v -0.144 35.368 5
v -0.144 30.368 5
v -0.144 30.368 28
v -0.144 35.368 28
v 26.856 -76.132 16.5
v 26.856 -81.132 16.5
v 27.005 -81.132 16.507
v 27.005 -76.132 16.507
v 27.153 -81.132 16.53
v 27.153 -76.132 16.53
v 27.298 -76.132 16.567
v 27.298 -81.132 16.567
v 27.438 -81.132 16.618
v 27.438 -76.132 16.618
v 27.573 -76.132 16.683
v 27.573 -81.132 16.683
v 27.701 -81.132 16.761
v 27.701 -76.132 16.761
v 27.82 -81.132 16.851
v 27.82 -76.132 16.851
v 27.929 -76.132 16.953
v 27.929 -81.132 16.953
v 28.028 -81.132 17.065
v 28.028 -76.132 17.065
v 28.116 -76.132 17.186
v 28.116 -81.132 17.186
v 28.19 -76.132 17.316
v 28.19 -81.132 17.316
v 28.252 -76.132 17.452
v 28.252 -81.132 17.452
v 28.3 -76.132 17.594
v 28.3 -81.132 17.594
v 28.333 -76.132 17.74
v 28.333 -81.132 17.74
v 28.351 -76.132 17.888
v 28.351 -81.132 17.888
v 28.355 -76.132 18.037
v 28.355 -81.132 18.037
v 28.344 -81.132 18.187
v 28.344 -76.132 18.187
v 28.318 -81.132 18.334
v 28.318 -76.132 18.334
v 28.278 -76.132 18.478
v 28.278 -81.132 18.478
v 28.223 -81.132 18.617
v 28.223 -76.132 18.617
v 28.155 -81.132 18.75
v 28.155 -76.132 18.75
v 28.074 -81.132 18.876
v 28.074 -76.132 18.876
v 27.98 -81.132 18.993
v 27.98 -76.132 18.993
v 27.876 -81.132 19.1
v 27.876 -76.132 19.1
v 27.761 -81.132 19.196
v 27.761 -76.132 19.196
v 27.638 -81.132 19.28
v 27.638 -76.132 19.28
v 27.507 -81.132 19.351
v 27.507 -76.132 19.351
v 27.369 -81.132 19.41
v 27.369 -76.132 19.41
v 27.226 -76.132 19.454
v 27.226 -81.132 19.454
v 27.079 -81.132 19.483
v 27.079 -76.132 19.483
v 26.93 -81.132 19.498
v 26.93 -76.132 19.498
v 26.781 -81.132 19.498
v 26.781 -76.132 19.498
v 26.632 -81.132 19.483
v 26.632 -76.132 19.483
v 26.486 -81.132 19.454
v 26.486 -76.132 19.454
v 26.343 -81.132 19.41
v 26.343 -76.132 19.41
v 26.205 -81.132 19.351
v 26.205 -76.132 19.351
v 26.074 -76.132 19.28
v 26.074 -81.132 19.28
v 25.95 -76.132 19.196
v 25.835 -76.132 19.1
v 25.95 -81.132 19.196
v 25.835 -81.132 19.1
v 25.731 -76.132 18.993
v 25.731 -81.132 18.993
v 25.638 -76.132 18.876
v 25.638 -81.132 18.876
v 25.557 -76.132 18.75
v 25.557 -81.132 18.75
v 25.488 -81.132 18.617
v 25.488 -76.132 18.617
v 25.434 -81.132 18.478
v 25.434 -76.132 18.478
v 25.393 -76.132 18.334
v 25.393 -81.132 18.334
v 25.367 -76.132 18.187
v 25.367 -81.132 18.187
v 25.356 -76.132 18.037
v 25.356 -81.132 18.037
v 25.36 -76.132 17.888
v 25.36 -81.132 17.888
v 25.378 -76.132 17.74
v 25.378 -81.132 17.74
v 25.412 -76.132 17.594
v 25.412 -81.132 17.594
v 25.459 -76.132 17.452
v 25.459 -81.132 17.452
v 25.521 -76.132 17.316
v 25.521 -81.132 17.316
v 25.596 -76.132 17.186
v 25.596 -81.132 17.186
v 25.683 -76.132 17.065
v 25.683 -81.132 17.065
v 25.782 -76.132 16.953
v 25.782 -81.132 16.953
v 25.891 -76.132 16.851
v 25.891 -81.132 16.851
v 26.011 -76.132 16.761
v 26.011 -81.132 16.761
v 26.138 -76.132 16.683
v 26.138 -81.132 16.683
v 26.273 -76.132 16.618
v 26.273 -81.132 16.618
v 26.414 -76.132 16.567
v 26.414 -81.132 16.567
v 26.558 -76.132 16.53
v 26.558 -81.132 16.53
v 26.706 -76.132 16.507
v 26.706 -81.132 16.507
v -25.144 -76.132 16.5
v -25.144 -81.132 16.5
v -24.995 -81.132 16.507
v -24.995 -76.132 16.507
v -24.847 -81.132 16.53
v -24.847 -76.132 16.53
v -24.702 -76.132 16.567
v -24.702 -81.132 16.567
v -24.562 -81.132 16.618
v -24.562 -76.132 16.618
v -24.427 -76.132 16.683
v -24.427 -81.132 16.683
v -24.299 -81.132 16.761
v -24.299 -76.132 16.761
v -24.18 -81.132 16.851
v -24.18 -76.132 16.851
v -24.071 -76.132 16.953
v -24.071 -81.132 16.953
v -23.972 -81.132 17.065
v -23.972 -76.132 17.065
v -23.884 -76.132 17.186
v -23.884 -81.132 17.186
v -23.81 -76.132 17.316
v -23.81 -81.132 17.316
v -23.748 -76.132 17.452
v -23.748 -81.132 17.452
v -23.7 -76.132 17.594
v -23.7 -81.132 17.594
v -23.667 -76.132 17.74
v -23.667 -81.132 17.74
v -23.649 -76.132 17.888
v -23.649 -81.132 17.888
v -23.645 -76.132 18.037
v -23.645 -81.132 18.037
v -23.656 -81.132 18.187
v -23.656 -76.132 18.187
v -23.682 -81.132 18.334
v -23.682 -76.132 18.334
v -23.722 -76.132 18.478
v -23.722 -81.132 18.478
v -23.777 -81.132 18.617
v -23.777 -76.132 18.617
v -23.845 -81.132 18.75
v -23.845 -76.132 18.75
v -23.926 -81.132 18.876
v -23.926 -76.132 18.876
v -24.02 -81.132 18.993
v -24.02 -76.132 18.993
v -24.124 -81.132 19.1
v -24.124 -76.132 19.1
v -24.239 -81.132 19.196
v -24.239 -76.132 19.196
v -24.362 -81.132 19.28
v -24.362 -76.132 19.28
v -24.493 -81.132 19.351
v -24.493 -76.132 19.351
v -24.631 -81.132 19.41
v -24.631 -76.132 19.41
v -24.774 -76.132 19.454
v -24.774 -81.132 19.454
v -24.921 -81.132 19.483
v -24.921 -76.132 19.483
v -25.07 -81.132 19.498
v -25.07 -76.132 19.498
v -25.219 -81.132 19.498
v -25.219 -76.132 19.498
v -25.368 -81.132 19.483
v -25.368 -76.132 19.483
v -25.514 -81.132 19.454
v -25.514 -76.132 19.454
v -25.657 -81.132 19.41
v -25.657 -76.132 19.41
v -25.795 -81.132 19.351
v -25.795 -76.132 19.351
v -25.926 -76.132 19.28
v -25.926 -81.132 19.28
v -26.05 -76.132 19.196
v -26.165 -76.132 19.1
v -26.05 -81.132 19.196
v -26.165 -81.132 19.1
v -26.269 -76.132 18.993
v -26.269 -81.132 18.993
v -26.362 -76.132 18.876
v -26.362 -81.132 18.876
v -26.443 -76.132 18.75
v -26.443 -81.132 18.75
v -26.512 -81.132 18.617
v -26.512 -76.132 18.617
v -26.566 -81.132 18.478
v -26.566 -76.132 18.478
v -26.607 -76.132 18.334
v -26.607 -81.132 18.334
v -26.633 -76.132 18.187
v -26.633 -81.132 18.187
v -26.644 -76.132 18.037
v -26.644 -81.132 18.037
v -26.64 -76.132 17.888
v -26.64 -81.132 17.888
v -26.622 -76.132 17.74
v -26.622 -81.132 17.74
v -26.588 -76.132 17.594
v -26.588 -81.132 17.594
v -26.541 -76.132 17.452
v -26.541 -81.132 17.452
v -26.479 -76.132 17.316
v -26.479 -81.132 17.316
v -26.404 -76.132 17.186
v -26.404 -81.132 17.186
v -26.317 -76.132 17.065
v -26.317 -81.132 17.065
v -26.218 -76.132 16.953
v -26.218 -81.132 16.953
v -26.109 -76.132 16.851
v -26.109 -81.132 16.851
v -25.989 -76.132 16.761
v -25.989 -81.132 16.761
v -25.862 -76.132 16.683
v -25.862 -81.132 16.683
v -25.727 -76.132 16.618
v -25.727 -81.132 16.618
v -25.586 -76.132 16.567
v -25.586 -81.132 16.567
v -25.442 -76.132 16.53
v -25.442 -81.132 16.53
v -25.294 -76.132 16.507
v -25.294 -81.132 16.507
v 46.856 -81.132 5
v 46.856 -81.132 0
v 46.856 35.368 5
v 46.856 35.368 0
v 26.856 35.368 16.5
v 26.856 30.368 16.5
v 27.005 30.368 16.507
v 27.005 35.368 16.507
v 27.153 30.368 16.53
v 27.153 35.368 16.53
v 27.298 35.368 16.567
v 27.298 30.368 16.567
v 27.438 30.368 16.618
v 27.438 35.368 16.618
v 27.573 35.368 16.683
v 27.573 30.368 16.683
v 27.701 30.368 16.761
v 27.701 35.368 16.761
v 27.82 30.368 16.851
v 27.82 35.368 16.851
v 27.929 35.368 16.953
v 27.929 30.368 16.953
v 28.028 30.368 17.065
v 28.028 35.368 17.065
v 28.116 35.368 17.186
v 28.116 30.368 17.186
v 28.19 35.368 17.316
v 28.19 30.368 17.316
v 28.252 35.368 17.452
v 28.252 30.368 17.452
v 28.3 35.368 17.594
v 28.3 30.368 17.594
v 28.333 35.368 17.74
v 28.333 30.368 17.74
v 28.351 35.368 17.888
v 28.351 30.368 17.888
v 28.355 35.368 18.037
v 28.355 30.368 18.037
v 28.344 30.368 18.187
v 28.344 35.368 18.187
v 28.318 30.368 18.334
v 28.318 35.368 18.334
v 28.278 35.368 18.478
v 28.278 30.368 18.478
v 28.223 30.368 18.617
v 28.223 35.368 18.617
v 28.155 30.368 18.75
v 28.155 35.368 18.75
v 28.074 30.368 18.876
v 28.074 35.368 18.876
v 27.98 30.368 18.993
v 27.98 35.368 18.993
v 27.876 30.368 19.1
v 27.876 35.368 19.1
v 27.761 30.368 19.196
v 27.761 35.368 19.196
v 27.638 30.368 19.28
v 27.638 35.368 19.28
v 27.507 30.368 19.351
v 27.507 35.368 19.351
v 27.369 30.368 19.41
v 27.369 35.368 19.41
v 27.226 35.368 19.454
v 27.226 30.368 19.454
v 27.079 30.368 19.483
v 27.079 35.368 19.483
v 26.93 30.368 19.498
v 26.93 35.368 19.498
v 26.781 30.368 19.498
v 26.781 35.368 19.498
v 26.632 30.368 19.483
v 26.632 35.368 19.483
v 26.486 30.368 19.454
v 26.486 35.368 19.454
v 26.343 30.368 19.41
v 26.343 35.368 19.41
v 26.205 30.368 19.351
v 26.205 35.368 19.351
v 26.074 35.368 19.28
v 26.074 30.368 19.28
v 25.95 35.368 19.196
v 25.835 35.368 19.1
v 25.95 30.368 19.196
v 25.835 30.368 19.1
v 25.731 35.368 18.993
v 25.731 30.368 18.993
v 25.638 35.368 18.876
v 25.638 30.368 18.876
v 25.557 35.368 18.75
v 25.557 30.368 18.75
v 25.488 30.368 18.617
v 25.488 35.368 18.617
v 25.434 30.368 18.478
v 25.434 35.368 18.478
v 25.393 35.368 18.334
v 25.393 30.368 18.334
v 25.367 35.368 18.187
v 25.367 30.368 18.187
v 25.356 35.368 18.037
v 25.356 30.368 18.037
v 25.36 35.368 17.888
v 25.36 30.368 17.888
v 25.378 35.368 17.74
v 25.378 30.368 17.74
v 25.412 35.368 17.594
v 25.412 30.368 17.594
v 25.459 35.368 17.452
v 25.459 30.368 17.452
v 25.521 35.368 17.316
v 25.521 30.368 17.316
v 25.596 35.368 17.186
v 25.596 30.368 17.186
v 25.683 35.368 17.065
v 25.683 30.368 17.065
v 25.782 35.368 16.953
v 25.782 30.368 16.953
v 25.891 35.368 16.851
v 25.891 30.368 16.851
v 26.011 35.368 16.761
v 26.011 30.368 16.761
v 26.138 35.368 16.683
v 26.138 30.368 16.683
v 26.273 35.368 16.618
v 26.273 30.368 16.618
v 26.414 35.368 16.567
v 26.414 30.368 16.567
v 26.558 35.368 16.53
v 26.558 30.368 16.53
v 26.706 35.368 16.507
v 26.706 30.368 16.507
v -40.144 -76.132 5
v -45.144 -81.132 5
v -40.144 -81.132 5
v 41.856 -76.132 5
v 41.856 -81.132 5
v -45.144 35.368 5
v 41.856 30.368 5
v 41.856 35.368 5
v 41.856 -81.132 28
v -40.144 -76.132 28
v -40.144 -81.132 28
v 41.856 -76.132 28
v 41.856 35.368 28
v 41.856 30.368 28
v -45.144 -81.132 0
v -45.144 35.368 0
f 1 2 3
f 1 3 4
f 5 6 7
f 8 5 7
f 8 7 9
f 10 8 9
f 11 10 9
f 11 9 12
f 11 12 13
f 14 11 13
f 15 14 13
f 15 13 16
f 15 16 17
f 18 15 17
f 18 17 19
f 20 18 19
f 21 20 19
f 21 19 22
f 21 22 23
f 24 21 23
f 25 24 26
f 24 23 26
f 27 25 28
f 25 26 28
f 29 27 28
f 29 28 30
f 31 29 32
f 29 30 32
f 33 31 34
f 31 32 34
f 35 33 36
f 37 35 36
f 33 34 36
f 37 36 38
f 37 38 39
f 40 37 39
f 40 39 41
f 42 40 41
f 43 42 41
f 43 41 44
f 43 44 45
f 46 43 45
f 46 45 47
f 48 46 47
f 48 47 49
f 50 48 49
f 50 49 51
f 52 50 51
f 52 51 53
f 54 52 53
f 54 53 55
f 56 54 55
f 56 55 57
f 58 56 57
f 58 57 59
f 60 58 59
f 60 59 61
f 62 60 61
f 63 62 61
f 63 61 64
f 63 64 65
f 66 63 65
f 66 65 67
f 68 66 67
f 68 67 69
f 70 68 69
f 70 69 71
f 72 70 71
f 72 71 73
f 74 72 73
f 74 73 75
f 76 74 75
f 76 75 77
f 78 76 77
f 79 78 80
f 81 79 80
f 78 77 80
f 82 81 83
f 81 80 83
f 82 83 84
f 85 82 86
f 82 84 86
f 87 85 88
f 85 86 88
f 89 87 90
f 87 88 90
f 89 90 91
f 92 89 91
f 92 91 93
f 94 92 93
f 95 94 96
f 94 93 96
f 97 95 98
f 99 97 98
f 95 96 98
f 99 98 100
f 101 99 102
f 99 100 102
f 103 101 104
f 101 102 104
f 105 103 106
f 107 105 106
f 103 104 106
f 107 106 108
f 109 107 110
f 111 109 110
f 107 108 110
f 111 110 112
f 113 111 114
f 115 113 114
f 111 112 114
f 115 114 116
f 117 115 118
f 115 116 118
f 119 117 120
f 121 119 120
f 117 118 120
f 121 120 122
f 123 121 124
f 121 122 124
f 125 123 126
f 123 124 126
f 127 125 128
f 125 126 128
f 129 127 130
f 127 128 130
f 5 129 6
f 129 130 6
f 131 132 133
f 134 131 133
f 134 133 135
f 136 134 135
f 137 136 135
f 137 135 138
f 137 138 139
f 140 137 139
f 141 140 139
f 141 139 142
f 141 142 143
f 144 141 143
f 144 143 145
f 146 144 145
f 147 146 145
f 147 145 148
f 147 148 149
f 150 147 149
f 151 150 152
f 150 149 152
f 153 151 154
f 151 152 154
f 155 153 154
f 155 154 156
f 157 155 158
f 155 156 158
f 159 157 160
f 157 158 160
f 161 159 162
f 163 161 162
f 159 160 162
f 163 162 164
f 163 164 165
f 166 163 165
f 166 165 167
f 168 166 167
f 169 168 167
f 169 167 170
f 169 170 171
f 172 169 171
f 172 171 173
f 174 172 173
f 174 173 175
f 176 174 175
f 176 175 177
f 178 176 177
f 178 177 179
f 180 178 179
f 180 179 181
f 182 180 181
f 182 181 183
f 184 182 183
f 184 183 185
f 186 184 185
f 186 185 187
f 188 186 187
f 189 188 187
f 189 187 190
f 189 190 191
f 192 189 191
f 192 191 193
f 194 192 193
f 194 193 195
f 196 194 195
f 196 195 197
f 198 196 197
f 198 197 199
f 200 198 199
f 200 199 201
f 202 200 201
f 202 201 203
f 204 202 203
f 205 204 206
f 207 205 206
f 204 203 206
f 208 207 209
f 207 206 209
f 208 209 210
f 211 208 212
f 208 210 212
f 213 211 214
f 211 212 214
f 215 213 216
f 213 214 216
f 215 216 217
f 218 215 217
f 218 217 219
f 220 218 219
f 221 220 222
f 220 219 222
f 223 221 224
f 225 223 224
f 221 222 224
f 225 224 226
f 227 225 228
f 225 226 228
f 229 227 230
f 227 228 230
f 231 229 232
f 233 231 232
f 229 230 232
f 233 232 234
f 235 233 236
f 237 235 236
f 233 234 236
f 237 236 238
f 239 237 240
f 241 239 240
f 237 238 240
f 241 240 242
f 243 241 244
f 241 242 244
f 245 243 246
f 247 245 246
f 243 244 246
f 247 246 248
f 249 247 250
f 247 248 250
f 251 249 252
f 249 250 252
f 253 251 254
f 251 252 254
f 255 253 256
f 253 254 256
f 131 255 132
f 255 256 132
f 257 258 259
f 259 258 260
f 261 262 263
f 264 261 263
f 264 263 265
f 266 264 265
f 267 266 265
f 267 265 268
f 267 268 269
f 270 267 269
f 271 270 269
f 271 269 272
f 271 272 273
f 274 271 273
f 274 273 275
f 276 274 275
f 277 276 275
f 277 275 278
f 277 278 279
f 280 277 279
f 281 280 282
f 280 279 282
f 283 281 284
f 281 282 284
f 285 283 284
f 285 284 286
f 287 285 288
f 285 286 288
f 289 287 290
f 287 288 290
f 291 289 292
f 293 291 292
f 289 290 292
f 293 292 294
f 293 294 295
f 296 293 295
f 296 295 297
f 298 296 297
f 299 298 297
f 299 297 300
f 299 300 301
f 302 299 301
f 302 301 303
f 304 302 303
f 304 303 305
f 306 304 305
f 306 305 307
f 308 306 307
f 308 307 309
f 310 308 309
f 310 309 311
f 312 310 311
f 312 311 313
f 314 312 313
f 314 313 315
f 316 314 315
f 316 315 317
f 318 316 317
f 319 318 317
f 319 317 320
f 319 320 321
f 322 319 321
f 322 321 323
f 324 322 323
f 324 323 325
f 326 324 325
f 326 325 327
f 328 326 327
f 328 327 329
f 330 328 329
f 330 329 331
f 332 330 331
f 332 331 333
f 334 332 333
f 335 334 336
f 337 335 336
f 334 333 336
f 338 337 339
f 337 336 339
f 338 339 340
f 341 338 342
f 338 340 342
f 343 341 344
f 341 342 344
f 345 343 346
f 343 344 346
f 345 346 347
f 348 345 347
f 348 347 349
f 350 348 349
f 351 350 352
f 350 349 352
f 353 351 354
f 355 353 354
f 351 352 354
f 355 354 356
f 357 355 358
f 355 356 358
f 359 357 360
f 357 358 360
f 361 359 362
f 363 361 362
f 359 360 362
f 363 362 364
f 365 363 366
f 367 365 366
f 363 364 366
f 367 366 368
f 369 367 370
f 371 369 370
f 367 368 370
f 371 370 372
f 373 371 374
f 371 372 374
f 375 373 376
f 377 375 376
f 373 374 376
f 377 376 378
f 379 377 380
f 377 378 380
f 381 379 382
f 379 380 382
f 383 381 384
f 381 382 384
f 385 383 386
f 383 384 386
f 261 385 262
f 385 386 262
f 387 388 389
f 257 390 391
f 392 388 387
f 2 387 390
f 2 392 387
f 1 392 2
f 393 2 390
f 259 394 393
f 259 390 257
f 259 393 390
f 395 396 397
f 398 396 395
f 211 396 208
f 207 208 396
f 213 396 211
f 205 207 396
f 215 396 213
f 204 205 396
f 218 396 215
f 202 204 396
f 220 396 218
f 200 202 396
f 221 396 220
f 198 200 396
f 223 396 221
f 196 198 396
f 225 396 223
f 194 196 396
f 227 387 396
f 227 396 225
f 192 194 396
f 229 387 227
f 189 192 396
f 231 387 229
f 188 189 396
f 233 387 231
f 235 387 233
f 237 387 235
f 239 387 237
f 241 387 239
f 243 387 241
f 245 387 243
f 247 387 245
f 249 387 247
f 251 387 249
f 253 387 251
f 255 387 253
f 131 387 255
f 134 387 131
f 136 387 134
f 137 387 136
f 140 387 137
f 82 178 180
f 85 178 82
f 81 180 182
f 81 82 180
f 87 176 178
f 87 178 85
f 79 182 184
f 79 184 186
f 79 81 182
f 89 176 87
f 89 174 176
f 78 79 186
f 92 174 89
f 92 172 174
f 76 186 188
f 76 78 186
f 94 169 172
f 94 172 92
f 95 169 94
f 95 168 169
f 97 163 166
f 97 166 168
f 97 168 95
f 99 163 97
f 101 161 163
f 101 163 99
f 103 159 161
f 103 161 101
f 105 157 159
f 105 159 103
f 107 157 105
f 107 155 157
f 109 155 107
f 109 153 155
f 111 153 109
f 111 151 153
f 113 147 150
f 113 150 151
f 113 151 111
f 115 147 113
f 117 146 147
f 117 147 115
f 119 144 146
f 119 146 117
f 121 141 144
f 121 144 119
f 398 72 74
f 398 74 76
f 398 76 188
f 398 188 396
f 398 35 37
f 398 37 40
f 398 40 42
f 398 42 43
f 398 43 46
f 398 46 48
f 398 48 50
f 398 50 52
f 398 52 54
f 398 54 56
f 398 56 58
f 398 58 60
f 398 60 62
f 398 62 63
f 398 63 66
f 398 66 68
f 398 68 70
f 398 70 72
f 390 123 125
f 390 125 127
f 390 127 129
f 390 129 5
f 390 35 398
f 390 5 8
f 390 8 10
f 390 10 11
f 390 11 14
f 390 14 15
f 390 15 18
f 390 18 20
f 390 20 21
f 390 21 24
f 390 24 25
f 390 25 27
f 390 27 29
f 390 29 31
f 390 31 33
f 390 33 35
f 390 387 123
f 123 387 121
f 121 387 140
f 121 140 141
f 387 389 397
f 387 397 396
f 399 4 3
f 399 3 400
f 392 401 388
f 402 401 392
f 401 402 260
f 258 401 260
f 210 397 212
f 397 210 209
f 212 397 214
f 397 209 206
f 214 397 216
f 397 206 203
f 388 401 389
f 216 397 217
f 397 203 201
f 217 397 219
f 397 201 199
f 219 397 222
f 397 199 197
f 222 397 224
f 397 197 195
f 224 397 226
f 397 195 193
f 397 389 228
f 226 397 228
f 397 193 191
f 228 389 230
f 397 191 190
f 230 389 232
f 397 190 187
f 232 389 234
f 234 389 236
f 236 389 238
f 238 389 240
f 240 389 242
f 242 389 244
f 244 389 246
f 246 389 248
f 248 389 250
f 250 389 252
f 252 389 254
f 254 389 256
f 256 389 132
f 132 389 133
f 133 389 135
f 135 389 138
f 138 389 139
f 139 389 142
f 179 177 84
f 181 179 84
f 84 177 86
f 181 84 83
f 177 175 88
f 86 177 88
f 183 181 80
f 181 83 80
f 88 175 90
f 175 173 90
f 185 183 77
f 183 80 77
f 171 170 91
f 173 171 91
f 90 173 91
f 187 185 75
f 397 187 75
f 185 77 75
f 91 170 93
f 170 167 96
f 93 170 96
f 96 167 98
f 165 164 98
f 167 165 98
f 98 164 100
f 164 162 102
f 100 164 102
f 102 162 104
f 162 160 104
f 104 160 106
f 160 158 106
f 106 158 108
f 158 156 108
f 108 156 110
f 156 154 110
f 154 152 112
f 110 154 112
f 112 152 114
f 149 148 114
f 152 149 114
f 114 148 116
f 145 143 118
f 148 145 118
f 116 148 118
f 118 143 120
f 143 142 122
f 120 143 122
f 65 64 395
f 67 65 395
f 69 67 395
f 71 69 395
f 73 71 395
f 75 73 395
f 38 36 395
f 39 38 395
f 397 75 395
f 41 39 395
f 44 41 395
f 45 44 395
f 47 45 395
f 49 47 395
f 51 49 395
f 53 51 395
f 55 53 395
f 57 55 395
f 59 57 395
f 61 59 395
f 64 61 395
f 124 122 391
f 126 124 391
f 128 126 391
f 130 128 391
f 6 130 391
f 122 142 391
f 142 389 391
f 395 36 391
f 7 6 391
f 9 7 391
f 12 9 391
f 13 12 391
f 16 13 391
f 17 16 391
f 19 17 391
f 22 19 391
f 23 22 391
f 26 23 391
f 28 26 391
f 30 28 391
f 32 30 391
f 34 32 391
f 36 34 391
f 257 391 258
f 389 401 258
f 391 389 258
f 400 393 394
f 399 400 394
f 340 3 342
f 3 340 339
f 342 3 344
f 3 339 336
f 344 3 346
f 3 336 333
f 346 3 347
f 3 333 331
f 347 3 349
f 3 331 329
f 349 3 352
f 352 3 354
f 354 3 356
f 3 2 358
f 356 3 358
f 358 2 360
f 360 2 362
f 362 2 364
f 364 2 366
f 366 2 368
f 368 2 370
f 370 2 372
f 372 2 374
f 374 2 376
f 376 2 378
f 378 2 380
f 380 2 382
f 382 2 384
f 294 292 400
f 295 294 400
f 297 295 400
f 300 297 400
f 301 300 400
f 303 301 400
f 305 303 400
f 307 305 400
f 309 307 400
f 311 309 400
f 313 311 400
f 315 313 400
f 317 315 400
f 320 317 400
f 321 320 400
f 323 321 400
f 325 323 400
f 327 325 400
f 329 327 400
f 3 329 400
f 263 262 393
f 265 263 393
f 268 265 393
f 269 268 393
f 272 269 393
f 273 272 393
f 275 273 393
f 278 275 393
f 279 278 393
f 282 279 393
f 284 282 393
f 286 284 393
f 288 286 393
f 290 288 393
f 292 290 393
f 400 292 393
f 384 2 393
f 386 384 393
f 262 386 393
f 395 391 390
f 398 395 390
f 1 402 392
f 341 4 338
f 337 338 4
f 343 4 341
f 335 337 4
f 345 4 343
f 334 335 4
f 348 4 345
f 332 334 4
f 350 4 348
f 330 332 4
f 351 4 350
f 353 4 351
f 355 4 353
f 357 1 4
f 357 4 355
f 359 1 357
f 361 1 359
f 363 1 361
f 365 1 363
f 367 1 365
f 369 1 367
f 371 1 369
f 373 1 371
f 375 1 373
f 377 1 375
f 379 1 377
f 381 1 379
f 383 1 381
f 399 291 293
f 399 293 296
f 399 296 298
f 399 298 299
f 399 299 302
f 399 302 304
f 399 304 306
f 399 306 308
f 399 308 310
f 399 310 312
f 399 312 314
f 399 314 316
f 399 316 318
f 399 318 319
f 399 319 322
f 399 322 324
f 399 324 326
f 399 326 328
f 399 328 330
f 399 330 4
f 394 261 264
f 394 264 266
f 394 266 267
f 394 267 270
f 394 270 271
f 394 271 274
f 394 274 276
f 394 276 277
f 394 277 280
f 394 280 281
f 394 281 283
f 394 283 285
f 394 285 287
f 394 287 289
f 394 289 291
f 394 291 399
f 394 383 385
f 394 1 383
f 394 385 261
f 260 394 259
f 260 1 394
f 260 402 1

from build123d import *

# Parameters (mm, degrees)
SKETCH_1_W          = 92
SKETCH_1_H          = 116.5
EXTRUDE_1_DEPTH     = 5
SKETCH_2_W          = 82
SKETCH_2_H          = 5
SKETCH_2_W_2        = 42
EXTRUDE_2_DEPTH     = 23
SKETCH_3_R          = 1.5
CUT_EXTRUDE_1_DEPTH = 129.653427027


with BuildPart() as part:
    # 草圖1 → 填料-伸長1 (new body)
    with BuildSketch(Plane.XY):
        with Locations((0.855675066, -22.881766382)):
            Rectangle(SKETCH_1_W, SKETCH_1_H)
    extrude(amount=EXTRUDE_1_DEPTH)

    # 草圖2 → 填料-伸長2 (add)
    with BuildSketch(Plane.XY.offset(5)):
        with Locations((0.855675066, -78.631766382)):
            Rectangle(SKETCH_2_W, SKETCH_2_H)
        with Locations((20.855675066, 32.868233618)):
            Rectangle(SKETCH_2_W_2, SKETCH_2_H)
    extrude(amount=EXTRUDE_2_DEPTH)

    # 草圖3 → 除料-伸長1 (cut, through all)
    with BuildSketch(Plane.XZ.offset(81.131766382)):
        with Locations(Location((-25.144324934, 18, 0), (0, 0, 270))):
            Circle(SKETCH_3_R)
        with Locations(Location((26.855675066, 18, 0), (0, 0, 270))):
            Circle(SKETCH_3_R)
    extrude(amount=-CUT_EXTRUDE_1_DEPTH, mode=Mode.SUBTRACT)


solid = part.part
